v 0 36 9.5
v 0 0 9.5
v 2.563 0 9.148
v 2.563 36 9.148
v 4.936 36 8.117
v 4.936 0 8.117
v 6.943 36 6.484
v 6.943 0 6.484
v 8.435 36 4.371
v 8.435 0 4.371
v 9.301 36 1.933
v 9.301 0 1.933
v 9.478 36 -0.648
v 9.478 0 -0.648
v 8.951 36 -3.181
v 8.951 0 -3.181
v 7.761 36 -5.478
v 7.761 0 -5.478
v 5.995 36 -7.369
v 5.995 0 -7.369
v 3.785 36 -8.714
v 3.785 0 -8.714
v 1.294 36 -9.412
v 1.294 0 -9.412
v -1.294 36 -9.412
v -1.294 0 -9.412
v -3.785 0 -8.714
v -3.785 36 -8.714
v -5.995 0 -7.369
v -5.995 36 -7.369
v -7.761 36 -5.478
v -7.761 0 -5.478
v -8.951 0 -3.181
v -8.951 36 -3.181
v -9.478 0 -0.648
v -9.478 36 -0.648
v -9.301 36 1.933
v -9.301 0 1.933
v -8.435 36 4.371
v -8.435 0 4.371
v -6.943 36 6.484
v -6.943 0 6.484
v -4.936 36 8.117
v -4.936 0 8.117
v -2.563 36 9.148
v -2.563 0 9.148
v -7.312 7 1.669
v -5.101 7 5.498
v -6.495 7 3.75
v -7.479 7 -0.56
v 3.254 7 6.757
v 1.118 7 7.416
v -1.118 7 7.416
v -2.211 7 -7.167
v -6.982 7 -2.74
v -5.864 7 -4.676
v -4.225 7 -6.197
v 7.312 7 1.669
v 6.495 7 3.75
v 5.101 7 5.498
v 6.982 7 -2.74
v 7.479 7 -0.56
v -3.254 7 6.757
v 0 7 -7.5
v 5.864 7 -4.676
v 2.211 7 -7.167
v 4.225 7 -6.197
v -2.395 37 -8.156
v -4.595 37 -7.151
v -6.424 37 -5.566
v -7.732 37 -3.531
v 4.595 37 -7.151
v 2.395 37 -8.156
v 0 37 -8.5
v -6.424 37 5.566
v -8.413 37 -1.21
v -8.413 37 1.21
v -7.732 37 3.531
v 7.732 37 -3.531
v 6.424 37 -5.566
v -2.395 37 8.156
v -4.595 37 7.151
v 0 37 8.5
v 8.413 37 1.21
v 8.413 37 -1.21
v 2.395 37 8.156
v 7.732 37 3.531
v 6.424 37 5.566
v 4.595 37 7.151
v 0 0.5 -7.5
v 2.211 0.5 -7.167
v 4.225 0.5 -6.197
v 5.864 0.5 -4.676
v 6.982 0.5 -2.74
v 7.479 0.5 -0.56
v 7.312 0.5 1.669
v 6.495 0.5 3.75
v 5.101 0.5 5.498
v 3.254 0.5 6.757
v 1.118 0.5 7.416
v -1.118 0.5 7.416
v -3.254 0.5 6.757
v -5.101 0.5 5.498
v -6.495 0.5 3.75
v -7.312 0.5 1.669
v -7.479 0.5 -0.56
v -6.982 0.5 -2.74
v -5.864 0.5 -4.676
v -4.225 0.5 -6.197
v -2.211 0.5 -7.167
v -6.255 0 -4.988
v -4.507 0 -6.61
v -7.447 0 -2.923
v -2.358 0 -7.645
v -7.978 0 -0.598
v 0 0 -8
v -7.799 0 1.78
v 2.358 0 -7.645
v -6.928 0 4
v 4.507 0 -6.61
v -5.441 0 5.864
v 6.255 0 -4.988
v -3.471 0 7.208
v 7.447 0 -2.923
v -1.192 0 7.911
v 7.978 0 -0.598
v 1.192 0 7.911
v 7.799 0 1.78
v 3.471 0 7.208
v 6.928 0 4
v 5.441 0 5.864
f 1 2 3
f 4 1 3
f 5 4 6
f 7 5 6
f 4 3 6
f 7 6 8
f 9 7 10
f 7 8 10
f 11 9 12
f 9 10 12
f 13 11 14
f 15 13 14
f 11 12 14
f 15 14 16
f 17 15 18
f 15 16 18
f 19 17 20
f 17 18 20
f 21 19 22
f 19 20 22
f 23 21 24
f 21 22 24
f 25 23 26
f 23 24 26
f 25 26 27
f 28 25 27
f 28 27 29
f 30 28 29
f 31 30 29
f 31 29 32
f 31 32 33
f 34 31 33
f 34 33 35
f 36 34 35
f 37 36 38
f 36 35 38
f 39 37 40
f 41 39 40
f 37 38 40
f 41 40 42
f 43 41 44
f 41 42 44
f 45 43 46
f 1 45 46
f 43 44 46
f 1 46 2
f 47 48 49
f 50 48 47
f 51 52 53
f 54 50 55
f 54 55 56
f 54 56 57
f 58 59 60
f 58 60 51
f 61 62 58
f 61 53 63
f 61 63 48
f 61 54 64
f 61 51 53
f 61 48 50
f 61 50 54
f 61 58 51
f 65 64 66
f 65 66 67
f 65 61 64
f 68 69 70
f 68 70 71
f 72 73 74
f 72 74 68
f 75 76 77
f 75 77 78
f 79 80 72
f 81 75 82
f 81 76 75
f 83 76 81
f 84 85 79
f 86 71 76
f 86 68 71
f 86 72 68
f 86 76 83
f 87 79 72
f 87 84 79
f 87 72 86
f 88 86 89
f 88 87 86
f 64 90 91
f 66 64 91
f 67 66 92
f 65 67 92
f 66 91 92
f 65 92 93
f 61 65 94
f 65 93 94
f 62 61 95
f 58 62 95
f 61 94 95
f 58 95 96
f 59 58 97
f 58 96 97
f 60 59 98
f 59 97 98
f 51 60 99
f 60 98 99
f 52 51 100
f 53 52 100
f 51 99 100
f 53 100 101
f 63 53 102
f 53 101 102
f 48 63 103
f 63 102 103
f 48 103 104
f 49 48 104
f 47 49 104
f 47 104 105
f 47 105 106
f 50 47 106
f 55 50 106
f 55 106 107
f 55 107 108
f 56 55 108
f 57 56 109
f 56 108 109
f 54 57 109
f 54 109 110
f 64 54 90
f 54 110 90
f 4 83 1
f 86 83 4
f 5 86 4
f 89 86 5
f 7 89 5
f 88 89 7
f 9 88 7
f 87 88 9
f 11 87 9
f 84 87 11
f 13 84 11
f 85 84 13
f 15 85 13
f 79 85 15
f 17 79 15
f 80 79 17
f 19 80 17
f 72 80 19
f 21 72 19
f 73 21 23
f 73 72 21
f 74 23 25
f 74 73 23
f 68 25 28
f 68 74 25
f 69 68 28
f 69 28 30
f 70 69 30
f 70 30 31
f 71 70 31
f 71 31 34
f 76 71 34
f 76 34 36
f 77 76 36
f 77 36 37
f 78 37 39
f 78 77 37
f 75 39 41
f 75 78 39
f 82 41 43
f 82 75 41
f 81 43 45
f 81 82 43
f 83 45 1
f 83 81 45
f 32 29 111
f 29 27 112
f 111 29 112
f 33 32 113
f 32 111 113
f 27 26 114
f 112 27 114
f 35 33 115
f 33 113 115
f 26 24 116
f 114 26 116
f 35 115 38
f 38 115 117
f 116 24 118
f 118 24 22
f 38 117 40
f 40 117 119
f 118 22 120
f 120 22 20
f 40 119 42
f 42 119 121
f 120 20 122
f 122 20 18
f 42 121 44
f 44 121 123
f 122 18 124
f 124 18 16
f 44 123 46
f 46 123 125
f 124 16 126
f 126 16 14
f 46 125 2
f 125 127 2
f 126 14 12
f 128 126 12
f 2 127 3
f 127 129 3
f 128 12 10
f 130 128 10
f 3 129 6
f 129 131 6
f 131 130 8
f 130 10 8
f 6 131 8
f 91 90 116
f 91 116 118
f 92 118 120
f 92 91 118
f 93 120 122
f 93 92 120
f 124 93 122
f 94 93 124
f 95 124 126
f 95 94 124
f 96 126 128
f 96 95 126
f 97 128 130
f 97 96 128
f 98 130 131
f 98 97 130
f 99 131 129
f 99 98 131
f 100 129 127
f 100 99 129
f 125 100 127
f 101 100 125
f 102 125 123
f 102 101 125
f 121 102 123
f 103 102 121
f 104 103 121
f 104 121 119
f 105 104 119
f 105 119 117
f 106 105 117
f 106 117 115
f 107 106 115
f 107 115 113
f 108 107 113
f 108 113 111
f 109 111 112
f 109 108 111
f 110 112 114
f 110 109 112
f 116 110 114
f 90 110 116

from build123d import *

# Parameters (mm, degrees)
SKETCH_1_R          = 9.5
EXTRUDE_1_DEPTH     = 37
SKETCH_2_R          = 7.5
CUT_EXTRUDE_1_DEPTH = 7
CHAMFER_1_SIZE      = 1
CHAMFER_2_SIZE      = 0.5


with BuildPart() as part:
    # 草图1 → 凸台-拉伸1 (new body)
    with BuildSketch(Plane(origin=(0, 0, 0), x_dir=(1, 0, 0), z_dir=(0, 1, 0))):
        with Locations(Location((0, 0, 0), (0, 0, 270))):
            Circle(SKETCH_1_R)
    extrude(amount=EXTRUDE_1_DEPTH)

    # 草图2 → 切除-拉伸1 (cut)
    with BuildSketch(Plane.XZ):
        with Locations(Location((0, 0, 0), (0, 0, 270))):
            Circle(SKETCH_2_R)
    extrude(amount=-CUT_EXTRUDE_1_DEPTH, mode=Mode.SUBTRACT)

    # 倒角1
    chamfer_1_edges = [part.edges().sort_by_distance(p)[0] for p in [
        (0, 37, -9.5),
    ]]
    chamfer(chamfer_1_edges, length=CHAMFER_1_SIZE)

    # 倒角2
    chamfer_2_edges = [part.edges().sort_by_distance(p)[0] for p in [
        (0, 0, 7.5),
    ]]
    chamfer(chamfer_2_edges, length=CHAMFER_2_SIZE)


solid = part.part
